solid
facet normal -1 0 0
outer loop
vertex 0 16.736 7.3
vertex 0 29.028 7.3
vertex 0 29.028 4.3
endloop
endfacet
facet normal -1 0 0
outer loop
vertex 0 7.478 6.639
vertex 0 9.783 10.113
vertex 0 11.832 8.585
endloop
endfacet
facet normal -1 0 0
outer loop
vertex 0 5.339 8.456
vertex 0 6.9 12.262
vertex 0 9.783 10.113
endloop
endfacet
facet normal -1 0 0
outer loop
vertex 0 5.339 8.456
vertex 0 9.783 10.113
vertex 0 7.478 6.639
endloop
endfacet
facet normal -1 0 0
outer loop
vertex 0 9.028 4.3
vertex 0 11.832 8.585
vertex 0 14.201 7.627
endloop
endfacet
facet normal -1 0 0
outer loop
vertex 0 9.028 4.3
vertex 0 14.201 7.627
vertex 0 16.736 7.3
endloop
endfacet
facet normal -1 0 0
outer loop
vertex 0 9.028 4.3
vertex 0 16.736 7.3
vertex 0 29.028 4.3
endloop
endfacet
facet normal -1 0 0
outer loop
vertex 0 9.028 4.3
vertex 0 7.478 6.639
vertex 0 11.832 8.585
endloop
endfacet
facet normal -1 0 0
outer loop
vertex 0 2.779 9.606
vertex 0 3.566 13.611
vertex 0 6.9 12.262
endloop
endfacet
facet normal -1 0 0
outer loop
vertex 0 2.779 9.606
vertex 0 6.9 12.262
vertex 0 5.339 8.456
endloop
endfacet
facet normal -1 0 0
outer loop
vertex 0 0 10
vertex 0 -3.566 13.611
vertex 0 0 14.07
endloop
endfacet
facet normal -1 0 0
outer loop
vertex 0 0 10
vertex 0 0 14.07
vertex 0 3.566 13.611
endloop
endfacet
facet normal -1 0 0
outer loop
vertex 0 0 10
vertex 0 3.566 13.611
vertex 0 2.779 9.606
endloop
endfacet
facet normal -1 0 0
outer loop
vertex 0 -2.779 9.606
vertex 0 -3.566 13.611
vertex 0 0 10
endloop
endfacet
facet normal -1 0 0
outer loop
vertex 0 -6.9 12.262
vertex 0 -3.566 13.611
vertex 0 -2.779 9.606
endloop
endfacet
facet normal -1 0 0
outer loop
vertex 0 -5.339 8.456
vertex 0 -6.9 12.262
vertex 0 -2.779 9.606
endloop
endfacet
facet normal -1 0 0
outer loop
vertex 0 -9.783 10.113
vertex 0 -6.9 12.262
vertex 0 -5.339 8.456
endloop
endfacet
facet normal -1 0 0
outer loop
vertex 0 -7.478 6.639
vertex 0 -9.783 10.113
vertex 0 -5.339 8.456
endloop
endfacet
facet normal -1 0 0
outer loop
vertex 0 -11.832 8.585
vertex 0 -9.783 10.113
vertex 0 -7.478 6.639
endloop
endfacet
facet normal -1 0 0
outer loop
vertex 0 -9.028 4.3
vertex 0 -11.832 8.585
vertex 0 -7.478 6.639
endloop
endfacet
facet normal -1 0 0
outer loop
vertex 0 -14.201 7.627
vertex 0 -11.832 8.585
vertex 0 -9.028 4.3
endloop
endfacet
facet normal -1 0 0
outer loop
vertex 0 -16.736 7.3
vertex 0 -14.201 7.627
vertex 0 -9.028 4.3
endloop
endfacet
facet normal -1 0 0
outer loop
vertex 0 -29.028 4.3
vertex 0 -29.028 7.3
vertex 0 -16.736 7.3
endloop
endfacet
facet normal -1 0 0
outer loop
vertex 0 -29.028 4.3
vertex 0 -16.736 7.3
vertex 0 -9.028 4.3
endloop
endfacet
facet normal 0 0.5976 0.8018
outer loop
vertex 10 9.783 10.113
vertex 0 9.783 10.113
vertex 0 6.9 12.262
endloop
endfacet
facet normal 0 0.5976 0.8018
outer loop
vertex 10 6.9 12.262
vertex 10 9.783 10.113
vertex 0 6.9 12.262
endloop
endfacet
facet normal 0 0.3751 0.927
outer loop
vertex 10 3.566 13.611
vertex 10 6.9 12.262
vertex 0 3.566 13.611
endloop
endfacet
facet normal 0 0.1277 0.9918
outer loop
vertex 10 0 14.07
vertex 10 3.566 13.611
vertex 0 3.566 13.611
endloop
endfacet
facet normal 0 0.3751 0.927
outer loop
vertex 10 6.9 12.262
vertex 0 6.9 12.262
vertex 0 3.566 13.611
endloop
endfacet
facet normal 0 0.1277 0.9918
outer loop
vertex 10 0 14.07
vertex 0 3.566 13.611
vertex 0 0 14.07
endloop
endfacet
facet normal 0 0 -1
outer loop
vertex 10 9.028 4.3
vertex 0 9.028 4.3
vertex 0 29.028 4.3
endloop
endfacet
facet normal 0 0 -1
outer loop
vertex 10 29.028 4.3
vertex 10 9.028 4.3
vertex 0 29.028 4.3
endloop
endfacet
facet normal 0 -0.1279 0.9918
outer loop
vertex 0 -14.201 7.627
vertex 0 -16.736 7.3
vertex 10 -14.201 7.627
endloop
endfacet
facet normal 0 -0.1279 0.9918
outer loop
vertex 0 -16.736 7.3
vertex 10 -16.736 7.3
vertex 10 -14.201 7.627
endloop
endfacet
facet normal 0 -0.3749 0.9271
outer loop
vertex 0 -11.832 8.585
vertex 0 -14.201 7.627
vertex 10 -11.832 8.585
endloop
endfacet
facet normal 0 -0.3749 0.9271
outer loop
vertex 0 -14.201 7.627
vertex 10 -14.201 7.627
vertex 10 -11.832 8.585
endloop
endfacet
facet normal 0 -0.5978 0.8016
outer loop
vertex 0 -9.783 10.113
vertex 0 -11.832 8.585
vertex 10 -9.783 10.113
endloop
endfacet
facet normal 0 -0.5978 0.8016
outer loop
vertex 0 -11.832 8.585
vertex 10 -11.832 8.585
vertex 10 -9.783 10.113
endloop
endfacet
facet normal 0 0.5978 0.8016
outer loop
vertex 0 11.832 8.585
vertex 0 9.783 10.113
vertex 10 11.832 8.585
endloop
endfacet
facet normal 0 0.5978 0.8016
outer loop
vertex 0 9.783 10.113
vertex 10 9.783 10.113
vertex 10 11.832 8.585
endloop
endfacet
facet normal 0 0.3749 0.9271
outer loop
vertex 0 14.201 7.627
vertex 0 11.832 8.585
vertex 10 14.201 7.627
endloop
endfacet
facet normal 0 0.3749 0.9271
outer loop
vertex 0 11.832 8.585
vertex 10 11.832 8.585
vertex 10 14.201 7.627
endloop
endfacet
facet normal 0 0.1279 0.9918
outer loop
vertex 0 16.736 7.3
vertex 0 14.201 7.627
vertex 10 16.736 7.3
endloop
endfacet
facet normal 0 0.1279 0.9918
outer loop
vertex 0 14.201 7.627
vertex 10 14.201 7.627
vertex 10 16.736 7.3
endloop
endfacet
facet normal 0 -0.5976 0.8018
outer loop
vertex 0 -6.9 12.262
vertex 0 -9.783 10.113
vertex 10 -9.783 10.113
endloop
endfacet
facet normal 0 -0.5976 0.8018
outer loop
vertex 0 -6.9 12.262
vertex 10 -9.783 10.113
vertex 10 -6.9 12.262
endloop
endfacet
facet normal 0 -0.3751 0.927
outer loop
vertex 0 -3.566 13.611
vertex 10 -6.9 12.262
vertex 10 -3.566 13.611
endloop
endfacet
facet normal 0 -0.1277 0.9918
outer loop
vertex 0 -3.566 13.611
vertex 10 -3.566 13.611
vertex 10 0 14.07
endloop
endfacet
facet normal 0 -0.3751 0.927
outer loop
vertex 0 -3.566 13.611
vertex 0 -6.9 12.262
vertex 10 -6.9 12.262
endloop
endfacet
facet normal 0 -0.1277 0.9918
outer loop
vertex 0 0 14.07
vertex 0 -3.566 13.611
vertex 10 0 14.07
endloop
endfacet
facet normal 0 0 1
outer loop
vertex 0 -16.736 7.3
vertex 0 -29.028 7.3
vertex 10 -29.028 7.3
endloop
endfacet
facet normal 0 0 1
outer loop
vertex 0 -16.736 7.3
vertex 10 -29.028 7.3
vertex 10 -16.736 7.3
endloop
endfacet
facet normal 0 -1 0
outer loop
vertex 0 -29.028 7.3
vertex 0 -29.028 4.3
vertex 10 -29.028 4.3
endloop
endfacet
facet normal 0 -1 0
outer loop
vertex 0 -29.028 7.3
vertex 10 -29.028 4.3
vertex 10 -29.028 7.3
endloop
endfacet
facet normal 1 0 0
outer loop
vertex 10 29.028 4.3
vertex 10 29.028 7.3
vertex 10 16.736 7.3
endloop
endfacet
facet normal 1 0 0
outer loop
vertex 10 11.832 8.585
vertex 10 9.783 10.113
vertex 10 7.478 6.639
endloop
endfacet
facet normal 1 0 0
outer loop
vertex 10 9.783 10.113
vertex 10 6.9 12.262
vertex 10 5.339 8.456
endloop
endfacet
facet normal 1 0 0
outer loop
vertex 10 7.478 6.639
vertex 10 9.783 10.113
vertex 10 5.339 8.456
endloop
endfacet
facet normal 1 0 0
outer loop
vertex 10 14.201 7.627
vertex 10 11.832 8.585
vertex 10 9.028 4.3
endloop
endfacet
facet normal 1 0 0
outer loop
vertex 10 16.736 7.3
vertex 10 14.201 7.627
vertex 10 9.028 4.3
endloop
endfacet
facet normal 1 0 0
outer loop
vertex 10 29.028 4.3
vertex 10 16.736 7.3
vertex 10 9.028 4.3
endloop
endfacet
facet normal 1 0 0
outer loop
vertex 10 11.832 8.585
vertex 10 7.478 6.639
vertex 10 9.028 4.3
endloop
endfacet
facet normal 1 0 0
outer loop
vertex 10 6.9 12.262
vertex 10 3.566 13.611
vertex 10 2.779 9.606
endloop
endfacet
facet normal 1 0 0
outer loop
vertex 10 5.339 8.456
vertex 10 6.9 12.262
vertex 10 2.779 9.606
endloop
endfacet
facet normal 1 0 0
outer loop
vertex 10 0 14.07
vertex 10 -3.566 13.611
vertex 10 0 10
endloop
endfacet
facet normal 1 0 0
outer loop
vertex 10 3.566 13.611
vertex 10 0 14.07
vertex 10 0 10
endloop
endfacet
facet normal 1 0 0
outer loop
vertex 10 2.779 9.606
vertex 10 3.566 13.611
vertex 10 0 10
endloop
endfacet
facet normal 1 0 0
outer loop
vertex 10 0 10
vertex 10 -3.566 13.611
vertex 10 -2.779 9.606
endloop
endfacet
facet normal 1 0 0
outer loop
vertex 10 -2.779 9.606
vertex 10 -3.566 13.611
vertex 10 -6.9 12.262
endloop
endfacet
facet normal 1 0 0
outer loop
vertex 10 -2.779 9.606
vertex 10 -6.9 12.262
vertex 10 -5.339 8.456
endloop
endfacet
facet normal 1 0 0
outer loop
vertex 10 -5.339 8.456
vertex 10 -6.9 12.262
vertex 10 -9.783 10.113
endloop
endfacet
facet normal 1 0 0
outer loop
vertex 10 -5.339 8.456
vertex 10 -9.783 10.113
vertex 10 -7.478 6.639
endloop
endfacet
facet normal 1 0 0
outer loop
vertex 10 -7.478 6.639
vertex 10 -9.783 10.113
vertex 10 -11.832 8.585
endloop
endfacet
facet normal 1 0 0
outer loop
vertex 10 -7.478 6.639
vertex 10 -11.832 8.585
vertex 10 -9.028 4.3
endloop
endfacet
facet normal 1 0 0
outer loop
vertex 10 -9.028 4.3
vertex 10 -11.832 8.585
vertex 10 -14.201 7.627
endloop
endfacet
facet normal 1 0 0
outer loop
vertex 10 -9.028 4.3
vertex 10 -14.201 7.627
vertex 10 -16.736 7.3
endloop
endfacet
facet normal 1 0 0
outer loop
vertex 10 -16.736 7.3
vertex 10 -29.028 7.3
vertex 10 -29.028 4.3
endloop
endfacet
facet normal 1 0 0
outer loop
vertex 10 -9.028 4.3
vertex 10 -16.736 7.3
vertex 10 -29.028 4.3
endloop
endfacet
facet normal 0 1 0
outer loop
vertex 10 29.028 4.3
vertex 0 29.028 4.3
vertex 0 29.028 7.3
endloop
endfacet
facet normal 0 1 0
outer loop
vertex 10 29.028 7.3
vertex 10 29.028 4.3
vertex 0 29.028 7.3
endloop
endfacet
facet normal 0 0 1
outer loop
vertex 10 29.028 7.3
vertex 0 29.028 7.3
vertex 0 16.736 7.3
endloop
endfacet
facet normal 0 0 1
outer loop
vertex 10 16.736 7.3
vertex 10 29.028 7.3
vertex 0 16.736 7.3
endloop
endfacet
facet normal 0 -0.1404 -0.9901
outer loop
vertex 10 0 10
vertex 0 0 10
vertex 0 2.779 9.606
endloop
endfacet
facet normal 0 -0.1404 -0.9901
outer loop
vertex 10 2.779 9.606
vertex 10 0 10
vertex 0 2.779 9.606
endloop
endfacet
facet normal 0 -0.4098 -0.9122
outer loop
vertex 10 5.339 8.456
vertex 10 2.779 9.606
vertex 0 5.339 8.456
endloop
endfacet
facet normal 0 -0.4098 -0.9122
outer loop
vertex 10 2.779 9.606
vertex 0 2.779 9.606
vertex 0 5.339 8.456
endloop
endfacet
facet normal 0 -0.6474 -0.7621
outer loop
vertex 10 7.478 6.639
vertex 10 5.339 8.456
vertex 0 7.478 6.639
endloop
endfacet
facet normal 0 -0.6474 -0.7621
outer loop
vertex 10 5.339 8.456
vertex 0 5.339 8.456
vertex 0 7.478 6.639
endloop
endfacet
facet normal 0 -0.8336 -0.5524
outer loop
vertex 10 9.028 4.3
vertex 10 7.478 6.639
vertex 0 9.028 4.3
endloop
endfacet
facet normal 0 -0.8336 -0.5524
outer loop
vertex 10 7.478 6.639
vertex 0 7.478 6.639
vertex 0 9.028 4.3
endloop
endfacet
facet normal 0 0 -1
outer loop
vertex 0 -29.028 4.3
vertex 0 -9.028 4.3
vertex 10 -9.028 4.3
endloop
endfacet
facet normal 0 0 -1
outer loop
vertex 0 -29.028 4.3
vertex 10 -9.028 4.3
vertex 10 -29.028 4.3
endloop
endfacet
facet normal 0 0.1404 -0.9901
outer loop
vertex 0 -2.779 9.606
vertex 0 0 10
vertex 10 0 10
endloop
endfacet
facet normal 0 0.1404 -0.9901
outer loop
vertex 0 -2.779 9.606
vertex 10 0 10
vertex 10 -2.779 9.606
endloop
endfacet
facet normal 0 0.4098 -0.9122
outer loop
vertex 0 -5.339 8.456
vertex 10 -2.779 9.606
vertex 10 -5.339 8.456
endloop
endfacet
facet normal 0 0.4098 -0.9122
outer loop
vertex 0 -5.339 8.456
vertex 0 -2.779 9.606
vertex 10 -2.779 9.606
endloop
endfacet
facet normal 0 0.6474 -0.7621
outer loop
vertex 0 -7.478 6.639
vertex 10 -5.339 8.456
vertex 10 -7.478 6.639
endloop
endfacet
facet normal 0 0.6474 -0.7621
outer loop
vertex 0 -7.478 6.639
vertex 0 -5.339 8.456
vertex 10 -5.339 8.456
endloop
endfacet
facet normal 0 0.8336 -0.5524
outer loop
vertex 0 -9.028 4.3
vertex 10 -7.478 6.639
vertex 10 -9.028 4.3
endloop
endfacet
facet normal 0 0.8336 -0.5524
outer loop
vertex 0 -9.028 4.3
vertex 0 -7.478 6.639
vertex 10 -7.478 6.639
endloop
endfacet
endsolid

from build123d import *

# Parameters (mm, degrees)
EXTRUDE_1_DEPTH = 10
FILLET_1_R      = 10


with BuildPart() as part:
    # 草图1 → 凸台-拉伸1 (new body)
    with BuildSketch(Plane(origin=(0, 0, 0), x_dir=(0, 0, -1), z_dir=(1, 0, 0))):
        with BuildLine():
            Line((-4.3, 9.028288874), (-4.3, 29.028288874))
            Line((-4.3, 29.028288874), (-7.3, 29.028288874))
            Line((-7.3, 29.028288874), (-7.3, 12.028288874))
            ThreePointArc((-7.3, 12.028288874), (-12.261361814, 6.901357817), (-14.070171756, 0))
            Line((-14.070171756, 0), (-10, 0))
            ThreePointArc((-10, 0), (-8.455767263, 5.338539126), (-4.3, 9.028288874))
        make_face()
    extrude_1 = extrude(amount=EXTRUDE_1_DEPTH)

    # 镜向1: 凸台-拉伸1 across plane
    add(extrude_1.mirror(Plane(origin=(10, 0, 14.070171756), x_dir=(0, 0, 1), z_dir=(0, 1, 0))))

    # 圆角1
    fillet_1_edges = [part.edges().sort_by_distance(p)[0] for p in [
        (5, 12.028288874, 7.3),
        (5, -12.028288874, 7.3),
    ]]
    fillet(fillet_1_edges, radius=FILLET_1_R)


solid = part.part
